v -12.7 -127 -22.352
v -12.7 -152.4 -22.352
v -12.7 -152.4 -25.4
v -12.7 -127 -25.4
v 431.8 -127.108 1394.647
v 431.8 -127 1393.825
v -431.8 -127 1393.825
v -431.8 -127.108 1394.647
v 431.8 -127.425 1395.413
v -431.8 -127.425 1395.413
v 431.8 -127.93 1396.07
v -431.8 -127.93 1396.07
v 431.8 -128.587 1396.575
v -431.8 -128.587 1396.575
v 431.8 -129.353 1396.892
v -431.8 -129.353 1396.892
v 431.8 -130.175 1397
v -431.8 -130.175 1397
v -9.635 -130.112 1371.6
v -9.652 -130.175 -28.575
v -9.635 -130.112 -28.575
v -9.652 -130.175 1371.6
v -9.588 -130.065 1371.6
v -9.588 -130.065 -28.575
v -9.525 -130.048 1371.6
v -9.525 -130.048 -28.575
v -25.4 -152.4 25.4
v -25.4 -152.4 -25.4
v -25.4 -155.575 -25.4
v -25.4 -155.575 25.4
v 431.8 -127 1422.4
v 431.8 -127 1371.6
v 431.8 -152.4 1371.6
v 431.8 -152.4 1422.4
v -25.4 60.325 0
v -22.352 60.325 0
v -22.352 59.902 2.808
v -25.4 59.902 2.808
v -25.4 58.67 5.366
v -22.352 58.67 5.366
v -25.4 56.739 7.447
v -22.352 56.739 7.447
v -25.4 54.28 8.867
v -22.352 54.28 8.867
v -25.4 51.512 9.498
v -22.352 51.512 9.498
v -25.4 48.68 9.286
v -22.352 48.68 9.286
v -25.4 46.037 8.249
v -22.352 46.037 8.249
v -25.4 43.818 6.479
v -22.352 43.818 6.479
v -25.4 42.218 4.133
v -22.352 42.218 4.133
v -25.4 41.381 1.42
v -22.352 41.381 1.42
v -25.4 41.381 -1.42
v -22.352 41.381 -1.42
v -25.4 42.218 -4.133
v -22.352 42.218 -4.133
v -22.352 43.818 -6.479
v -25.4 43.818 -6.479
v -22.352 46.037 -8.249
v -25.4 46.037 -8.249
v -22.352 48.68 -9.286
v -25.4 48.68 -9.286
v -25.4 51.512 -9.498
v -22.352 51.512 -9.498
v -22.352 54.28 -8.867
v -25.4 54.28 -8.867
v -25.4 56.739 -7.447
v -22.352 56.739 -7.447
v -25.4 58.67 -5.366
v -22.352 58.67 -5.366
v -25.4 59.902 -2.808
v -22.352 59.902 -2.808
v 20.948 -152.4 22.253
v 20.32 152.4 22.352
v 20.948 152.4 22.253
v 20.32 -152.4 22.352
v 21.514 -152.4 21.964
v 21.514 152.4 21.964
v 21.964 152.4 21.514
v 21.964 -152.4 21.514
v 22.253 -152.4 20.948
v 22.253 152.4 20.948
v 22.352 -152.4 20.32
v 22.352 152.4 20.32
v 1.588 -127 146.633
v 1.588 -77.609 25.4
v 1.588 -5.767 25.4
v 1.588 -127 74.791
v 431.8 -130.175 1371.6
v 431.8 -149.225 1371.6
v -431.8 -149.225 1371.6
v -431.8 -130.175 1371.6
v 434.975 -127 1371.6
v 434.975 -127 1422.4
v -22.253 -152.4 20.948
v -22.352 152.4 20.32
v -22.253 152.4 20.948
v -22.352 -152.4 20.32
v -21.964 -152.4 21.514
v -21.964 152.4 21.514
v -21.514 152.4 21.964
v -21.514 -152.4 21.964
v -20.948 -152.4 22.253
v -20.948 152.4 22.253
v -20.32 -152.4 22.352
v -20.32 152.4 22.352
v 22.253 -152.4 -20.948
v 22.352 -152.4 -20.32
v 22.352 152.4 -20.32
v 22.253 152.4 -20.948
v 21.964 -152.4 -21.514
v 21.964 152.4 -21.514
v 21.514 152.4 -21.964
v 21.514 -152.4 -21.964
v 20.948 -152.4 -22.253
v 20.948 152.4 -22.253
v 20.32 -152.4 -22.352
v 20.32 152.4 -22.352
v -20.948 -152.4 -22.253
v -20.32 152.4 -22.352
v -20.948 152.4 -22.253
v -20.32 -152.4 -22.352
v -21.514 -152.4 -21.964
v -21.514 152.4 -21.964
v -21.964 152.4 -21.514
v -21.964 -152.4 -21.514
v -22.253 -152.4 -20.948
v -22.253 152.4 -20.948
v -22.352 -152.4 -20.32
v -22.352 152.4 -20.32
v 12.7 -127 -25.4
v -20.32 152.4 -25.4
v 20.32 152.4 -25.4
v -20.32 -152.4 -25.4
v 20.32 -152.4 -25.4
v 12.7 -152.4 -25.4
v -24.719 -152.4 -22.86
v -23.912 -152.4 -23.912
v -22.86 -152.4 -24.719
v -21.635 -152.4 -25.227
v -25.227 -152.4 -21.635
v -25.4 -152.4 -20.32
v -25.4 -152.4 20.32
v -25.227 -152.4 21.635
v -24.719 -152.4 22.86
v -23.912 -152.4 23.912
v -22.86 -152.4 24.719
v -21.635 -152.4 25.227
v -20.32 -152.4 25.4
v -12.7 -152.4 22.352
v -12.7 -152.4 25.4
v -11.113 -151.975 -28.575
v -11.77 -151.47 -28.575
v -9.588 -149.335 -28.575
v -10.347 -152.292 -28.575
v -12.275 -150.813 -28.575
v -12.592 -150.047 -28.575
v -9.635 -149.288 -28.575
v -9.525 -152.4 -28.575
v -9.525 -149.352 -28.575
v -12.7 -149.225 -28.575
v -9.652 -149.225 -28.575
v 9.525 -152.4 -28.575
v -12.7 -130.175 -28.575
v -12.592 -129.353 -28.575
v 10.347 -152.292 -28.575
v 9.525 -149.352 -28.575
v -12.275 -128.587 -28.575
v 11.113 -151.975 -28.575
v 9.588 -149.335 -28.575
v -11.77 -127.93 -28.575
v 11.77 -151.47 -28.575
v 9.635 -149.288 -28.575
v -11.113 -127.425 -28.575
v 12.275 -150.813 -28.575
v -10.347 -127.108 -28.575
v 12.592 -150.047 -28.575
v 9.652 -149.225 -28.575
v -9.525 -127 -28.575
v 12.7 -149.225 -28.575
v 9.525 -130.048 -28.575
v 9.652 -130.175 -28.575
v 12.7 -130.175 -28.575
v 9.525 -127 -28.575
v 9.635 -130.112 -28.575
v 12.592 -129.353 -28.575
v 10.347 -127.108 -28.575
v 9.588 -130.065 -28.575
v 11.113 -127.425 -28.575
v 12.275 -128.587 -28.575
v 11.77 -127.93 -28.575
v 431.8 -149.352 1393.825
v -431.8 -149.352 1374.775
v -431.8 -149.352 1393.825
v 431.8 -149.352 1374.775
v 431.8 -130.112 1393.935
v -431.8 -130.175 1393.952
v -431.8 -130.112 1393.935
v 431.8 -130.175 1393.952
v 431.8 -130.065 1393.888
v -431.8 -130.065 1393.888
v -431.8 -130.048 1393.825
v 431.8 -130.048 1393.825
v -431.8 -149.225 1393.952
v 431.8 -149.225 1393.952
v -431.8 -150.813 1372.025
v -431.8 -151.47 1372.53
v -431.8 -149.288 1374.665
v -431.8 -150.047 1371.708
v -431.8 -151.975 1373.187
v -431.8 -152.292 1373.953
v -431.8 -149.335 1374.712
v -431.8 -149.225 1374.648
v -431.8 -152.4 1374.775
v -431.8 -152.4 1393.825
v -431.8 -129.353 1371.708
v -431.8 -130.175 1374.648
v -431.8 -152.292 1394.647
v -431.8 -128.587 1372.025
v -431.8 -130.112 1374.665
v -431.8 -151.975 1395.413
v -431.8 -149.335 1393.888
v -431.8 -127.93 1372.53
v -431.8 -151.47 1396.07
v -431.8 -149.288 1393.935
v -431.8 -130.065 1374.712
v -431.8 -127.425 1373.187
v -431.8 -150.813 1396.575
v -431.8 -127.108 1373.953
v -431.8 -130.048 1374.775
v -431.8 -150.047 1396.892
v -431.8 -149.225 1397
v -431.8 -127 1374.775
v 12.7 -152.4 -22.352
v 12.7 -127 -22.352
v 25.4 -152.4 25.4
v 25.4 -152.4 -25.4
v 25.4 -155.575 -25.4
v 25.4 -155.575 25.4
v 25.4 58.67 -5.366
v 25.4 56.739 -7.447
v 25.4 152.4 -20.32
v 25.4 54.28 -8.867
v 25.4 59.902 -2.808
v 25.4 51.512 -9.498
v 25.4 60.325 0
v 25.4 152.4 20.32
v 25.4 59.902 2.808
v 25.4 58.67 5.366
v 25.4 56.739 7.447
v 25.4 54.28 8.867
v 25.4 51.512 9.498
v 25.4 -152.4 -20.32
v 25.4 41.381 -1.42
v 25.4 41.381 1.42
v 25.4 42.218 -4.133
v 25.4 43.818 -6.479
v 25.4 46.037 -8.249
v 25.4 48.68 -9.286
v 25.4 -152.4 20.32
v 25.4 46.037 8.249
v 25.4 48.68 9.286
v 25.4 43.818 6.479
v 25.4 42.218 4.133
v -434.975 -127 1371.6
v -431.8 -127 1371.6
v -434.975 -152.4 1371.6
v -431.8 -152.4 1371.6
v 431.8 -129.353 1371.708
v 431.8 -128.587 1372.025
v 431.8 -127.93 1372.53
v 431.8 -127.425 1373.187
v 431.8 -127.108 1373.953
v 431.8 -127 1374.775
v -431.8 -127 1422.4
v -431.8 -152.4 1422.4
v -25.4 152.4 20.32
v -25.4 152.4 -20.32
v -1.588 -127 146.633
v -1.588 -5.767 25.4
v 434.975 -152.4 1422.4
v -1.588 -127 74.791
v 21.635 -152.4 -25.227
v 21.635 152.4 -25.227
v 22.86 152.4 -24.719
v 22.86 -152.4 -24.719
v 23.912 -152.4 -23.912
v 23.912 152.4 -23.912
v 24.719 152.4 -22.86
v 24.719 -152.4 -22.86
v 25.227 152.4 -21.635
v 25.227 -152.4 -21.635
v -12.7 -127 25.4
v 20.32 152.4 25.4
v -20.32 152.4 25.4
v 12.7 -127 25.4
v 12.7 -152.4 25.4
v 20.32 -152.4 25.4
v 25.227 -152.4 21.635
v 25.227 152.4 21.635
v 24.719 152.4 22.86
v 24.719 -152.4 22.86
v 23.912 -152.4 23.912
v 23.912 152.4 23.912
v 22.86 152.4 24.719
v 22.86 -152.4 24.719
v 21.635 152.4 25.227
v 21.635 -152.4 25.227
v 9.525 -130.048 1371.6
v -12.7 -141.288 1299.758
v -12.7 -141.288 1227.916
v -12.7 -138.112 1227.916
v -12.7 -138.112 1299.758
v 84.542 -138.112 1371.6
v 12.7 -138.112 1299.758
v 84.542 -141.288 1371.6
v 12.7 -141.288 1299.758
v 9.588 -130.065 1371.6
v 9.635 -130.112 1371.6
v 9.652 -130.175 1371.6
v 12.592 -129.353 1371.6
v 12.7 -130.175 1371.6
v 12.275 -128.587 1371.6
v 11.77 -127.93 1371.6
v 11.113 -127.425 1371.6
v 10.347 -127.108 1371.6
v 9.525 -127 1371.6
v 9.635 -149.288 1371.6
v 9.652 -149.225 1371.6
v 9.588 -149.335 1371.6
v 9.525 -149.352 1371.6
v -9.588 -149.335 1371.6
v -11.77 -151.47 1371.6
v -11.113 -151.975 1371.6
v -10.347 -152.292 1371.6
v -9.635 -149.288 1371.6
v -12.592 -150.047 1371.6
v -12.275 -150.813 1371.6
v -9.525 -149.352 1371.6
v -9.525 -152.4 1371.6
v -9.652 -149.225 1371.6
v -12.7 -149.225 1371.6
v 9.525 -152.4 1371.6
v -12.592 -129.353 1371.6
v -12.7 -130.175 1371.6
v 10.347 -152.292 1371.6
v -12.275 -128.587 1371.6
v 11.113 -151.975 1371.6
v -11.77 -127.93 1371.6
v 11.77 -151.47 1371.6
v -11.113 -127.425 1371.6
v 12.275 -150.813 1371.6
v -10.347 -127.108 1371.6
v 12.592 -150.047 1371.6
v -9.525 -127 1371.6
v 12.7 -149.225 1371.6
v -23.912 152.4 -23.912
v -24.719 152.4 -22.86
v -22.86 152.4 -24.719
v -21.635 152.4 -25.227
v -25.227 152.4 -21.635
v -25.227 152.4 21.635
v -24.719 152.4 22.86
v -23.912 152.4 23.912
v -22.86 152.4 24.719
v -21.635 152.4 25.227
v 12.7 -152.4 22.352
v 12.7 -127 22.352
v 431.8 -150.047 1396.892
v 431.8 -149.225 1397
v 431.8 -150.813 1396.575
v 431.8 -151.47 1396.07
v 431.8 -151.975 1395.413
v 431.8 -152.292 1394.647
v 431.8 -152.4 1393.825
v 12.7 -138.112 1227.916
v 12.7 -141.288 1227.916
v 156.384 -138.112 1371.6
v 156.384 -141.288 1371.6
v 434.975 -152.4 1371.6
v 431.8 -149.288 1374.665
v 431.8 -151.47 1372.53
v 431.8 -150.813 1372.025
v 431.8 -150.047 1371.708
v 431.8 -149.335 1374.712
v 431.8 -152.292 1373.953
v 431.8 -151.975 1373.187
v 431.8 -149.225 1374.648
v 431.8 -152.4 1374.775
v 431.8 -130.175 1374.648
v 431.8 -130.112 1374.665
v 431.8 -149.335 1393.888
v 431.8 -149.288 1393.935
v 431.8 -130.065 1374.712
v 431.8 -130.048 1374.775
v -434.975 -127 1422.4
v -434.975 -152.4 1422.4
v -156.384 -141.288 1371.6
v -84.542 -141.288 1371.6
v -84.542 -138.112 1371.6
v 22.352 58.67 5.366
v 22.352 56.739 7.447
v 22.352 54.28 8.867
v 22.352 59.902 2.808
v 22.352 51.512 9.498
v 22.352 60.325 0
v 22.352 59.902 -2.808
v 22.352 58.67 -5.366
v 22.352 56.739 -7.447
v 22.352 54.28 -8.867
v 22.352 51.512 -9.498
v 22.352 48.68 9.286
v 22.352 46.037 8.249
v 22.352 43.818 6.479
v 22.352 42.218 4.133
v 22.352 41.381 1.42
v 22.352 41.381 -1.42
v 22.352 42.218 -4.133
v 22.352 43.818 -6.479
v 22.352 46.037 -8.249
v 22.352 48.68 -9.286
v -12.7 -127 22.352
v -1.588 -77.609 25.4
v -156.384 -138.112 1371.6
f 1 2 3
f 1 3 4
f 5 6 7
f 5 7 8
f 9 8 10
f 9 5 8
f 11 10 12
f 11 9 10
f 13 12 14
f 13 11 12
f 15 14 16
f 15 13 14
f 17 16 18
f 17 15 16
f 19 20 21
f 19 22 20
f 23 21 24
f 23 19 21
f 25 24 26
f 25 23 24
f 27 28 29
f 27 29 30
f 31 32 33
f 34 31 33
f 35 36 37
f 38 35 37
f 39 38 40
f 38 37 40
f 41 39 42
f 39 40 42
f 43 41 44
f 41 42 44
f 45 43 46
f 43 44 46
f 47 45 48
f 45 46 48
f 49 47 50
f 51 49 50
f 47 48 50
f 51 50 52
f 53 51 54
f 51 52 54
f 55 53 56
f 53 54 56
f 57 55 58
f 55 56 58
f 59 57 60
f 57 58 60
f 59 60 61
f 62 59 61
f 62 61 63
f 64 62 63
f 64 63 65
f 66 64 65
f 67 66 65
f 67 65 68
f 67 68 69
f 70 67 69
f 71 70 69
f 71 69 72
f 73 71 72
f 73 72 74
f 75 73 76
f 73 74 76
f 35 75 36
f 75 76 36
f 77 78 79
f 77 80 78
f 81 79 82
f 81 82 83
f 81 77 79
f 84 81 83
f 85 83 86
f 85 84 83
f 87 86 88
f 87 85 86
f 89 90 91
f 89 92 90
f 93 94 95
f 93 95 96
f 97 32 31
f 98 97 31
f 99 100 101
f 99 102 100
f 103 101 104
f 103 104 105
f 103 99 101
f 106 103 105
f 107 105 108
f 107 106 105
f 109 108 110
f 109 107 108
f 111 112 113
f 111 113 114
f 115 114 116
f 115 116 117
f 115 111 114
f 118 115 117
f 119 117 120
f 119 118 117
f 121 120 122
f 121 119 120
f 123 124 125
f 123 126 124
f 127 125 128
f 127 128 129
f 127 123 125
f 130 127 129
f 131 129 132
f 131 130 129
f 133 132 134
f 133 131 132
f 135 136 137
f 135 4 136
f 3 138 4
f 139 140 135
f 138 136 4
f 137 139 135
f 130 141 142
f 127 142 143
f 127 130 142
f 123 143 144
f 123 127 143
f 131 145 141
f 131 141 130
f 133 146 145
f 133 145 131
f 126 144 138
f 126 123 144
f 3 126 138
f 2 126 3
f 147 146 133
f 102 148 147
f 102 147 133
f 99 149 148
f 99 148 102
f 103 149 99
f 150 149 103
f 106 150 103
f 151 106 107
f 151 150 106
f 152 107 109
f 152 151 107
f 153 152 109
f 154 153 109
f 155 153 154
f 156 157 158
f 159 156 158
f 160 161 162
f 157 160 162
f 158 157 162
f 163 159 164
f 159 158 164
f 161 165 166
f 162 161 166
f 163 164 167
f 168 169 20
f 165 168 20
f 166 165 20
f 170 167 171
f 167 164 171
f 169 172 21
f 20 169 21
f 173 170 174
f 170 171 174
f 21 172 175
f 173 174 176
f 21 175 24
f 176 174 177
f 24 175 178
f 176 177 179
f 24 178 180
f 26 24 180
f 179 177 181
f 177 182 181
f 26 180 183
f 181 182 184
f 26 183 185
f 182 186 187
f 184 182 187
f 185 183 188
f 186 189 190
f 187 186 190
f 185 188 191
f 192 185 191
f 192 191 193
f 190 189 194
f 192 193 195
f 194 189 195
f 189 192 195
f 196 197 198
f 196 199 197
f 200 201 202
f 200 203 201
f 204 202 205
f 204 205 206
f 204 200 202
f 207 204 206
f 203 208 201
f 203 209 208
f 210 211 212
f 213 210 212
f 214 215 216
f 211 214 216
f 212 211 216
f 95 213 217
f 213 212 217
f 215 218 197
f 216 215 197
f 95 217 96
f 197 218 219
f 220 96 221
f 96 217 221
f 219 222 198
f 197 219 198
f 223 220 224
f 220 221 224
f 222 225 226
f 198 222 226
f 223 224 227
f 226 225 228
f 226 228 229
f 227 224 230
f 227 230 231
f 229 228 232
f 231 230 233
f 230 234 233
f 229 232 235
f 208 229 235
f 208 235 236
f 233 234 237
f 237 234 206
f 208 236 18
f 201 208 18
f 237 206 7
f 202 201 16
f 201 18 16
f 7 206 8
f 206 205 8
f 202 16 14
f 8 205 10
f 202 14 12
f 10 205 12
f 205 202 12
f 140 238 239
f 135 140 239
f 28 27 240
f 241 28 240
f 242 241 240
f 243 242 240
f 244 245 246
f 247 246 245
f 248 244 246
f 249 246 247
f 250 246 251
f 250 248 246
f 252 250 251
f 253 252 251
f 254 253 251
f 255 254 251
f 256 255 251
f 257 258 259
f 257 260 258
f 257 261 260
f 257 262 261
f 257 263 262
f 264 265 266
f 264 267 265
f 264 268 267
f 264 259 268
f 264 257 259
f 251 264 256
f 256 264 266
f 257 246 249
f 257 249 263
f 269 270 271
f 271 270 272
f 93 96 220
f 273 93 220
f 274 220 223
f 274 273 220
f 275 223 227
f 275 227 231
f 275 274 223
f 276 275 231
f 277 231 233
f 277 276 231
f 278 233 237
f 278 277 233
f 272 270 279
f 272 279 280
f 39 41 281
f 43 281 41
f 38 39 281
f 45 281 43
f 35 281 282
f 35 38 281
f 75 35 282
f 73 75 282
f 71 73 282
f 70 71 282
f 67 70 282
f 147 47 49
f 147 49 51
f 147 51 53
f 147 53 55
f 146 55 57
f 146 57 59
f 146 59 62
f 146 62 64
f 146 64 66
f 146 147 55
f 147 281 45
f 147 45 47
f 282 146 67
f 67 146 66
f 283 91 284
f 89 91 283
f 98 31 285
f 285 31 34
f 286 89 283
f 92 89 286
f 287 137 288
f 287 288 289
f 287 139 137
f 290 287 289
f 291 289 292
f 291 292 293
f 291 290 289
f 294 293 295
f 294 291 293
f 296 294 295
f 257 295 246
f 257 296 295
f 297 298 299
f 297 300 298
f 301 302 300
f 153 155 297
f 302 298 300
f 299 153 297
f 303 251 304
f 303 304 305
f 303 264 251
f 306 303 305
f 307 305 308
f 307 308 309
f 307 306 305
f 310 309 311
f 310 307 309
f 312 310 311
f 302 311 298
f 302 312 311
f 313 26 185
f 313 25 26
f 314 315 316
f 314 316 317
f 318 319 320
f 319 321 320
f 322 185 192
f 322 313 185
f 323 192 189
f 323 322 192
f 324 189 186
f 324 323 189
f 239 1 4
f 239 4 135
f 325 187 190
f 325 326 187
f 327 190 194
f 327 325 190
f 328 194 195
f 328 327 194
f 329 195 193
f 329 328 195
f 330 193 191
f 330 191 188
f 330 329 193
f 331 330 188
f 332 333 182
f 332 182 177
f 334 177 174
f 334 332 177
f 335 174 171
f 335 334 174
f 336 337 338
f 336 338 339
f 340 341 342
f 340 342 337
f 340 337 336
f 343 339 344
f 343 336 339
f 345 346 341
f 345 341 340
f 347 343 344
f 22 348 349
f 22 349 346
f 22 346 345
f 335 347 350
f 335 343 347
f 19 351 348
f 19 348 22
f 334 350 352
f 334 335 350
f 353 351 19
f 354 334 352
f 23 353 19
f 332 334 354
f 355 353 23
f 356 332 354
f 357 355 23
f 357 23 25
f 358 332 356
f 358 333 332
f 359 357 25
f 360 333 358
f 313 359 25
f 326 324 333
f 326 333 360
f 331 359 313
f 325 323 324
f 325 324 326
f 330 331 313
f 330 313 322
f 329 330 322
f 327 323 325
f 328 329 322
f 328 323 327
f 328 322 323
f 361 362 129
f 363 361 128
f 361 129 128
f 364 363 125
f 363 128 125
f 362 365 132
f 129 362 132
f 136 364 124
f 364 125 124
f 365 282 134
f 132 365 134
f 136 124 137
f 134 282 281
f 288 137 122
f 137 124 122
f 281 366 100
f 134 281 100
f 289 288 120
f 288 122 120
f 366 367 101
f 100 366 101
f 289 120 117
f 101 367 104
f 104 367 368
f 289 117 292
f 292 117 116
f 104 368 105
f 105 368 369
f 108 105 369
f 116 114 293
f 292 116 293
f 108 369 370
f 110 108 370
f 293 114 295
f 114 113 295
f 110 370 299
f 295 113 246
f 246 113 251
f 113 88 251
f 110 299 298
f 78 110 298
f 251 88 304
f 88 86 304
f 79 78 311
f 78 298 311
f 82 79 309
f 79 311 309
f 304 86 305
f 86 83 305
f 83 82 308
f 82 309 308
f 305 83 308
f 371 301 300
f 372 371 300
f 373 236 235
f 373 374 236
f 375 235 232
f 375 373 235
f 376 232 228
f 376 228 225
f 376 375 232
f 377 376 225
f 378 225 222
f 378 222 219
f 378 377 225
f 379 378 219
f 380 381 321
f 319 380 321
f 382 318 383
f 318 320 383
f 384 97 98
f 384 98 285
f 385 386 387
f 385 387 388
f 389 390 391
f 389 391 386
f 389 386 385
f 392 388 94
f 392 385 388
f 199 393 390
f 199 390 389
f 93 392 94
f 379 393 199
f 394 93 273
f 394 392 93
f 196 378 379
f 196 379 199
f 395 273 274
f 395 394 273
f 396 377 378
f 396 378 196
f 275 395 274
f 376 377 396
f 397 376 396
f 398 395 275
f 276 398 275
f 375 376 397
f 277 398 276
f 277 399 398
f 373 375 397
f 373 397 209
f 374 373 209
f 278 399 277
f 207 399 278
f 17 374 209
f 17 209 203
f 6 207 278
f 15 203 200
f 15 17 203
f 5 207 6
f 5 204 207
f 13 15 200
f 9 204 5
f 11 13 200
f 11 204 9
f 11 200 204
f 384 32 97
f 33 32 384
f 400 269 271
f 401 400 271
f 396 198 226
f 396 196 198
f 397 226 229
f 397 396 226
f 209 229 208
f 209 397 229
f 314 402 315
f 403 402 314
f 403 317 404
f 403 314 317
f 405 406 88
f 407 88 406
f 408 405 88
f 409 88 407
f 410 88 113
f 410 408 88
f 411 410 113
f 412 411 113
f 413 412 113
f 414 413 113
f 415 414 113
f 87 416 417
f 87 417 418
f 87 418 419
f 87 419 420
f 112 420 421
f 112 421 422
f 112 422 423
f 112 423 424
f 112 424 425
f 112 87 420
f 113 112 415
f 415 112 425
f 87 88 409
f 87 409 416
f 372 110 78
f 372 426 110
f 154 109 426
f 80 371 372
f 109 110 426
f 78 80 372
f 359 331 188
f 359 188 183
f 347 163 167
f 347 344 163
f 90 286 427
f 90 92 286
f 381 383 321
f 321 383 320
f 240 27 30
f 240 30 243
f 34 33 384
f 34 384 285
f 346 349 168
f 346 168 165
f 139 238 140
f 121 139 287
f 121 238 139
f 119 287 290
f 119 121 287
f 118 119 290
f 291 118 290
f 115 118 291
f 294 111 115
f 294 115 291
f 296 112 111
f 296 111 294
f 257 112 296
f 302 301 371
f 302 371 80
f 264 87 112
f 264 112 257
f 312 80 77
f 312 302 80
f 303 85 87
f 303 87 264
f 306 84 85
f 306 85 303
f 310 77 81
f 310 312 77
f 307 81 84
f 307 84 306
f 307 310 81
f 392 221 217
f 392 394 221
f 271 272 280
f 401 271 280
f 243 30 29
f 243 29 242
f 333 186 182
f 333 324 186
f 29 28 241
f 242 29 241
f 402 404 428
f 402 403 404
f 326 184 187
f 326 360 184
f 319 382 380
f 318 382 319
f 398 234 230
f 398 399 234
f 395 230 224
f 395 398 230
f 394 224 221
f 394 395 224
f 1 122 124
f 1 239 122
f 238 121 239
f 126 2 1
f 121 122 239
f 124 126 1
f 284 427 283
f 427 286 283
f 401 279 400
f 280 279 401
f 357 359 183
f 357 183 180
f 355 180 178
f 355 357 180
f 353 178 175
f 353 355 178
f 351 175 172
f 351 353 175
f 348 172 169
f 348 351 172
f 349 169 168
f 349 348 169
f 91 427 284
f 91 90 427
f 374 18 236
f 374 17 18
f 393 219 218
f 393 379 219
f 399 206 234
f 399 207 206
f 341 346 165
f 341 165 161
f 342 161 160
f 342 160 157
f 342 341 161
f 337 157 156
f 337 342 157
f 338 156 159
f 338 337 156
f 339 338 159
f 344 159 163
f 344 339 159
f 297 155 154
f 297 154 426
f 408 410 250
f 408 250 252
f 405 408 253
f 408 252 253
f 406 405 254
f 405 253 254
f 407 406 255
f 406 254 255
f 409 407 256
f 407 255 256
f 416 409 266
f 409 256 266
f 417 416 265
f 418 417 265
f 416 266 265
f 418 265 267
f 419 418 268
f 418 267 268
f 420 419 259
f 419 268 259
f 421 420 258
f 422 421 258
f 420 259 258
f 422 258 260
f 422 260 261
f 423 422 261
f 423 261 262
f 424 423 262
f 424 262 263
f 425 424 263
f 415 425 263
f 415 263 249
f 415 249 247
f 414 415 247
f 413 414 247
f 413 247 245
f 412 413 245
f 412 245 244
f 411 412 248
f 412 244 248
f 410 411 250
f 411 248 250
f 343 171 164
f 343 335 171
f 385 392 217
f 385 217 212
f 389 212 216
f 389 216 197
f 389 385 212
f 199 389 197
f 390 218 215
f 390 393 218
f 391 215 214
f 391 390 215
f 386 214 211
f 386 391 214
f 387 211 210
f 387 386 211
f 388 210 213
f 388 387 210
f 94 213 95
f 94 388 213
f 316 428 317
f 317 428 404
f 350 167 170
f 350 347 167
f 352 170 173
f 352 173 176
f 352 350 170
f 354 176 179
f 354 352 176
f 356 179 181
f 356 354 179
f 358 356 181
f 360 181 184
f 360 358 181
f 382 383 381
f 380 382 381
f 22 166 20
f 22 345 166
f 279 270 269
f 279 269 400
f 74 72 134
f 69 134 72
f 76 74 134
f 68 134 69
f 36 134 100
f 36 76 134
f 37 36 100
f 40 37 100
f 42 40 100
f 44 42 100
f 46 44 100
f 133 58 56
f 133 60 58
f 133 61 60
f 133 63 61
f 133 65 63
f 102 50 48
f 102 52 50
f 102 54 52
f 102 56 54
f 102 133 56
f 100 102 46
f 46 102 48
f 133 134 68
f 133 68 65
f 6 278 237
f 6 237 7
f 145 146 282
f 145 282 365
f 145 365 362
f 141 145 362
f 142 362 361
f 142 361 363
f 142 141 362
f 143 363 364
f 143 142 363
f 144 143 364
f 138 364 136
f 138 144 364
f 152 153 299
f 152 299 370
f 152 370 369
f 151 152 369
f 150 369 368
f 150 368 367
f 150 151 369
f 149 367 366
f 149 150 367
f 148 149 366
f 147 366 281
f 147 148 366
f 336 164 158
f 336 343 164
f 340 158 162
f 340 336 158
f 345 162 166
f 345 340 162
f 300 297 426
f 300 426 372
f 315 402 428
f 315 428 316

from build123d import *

# Parameters (mm, degrees)
F1_DEPTH  = 152.4
F2_W      = 25.4
F2_H      = 25.4
F3_DEPTH  = 25.4
F6_DEPTH  = 1371.6
F7_DEPTH  = 28.575
F4_R      = 9.525
F8_DEPTH  = 25.4
F9_W      = 50.8
F9_H      = 50.8
F10_DEPTH = 3.175
F12_DEPTH = 1.5875
F14_DEPTH = 431.8
F17_DEPTH = 1.5875
F19_W     = 25.4
F19_H     = 50.8
F20_DEPTH = 3.175


with BuildPart() as f1:
    # F0 (on Front) → F1 (new body, symmetric)
    with BuildSketch(Plane.XZ):
        with BuildLine():
            ThreePointArc((25.4, 20.32), (23.9121024484, 23.9121024484), (20.32, 25.4))
            Line((20.32, 25.4), (-20.32, 25.4))
            ThreePointArc((-20.32, 25.4), (-23.9121024484, 23.9121024484), (-25.4, 20.32))
            Line((-25.4, 20.32), (-25.4, -20.32))
            ThreePointArc((-25.4, -20.32), (-23.9121024484, -23.9121024484), (-20.32, -25.4))
            Line((-20.32, -25.4), (20.32, -25.4))
            ThreePointArc((20.32, -25.4), (23.9121024484, -23.9121024484), (25.4, -20.32))
            Line((25.4, -20.32), (25.4, 20.32))
        make_face()
        with BuildLine():
            ThreePointArc((22.352, -20.32), (21.7568409794, -21.7568409794), (20.32, -22.352))
            Line((20.32, -22.352), (-20.32, -22.352))
            ThreePointArc((-20.32, -22.352), (-21.7568409794, -21.7568409794), (-22.352, -20.32))
            Line((-22.352, -20.32), (-22.352, 20.32))
            ThreePointArc((-22.352, 20.32), (-21.7568409794, 21.7568409794), (-20.32, 22.352))
            Line((-20.32, 22.352), (20.32, 22.352))
            ThreePointArc((20.32, 22.352), (21.7568409794, 21.7568409794), (22.352, 20.32))
            Line((22.352, 20.32), (22.352, -20.32))
        make_face(mode=Mode.SUBTRACT)
    extrude(amount=F1_DEPTH, both=True)

    # F2 (on Top) → F3 (cut, symmetric)
    with BuildSketch(Plane.XY):
        with Locations((0, -139.7)):
            Rectangle(F2_W, F2_H)
    extrude(amount=F3_DEPTH, both=True, mode=Mode.SUBTRACT)

    # F4 (on Right) → F8 (cut, symmetric)
    with BuildSketch(Plane.YZ):
        with Locations((50.8, 0)):
            Circle(F4_R)
    extrude(amount=F8_DEPTH, both=True, mode=Mode.SUBTRACT)


with BuildPart() as f6:
    # F5 (on Top) → F6 (new body)
    with BuildSketch(Plane.XY):
        with BuildLine():
            ThreePointArc((12.7, -130.175), (11.7700640303, -127.9299359697), (9.525, -127))
            Line((9.525, -127), (-9.525, -127))
            ThreePointArc((-9.525, -127), (-11.7700640303, -127.9299359697), (-12.7, -130.175))
            Line((-12.7, -130.175), (-12.7, -149.225))
            ThreePointArc((-12.7, -149.225), (-11.7700640303, -151.4700640303), (-9.525, -152.4))
            Line((-9.525, -152.4), (9.525, -152.4))
            ThreePointArc((9.525, -152.4), (11.7700640303, -151.4700640303), (12.7, -149.225))
            Line((12.7, -149.225), (12.7, -130.175))
        make_face()
        with BuildLine():
            ThreePointArc((9.652, -149.225), (9.6148025612, -149.3148025612), (9.525, -149.352))
            Line((9.525, -149.352), (-9.525, -149.352))
            ThreePointArc((-9.525, -149.352), (-9.6148025612, -149.3148025612), (-9.652, -149.225))
            Line((-9.652, -149.225), (-9.652, -130.175))
            ThreePointArc((-9.652, -130.175), (-9.6148025612, -130.0851974388), (-9.525, -130.048))
            Line((-9.525, -130.048), (9.525, -130.048))
            ThreePointArc((9.525, -130.048), (9.6148025612, -130.0851974388), (9.652, -130.175))
            Line((9.652, -130.175), (9.652, -149.225))
        make_face(mode=Mode.SUBTRACT)
    extrude(amount=F6_DEPTH)

    # F5 (on Top) → F7 (join)
    with BuildSketch(Plane.XY):
        with BuildLine():
            ThreePointArc((12.7, -130.175), (11.7700640303, -127.9299359697), (9.525, -127))
            Line((9.525, -127), (-9.525, -127))
            ThreePointArc((-9.525, -127), (-11.7700640303, -127.9299359697), (-12.7, -130.175))
            Line((-12.7, -130.175), (-12.7, -149.225))
            ThreePointArc((-12.7, -149.225), (-11.7700640303, -151.4700640303), (-9.525, -152.4))
            Line((-9.525, -152.4), (9.525, -152.4))
            ThreePointArc((9.525, -152.4), (11.7700640303, -151.4700640303), (12.7, -149.225))
            Line((12.7, -149.225), (12.7, -130.175))
        make_face()
        with BuildLine():
            ThreePointArc((9.652, -149.225), (9.6148025612, -149.3148025612), (9.525, -149.352))
            Line((9.525, -149.352), (-9.525, -149.352))
            ThreePointArc((-9.525, -149.352), (-9.6148025612, -149.3148025612), (-9.652, -149.225))
            Line((-9.652, -149.225), (-9.652, -130.175))
            ThreePointArc((-9.652, -130.175), (-9.6148025612, -130.0851974388), (-9.525, -130.048))
            Line((-9.525, -130.048), (9.525, -130.048))
            ThreePointArc((9.525, -130.048), (9.6148025612, -130.0851974388), (9.652, -130.175))
            Line((9.652, -130.175), (9.652, -149.225))
        make_face(mode=Mode.SUBTRACT)
    extrude(amount=-F7_DEPTH)


with BuildPart() as f10:
    # F9 (on face) → F10 (new body)
    with BuildSketch(Plane.XZ.offset(152.4)):
        Rectangle(F9_W, F9_H)
    extrude(amount=F10_DEPTH)


with BuildPart() as f12:
    # F11 (on Right) → F12 (new body, symmetric)
    with BuildSketch(Plane.YZ):
        Polygon((-77.6085913341, 25.4), (-5.7665423656, 25.4), (-127, 146.6334576344), (-127, 74.7914086659), align=None)
    extrude(amount=F12_DEPTH, both=True)


with BuildPart() as f14:
    # F13 (on Right) → F14 (new body, symmetric)
    with BuildSketch(Plane.YZ):
        with BuildLine():
            ThreePointArc((-152.4, 1374.775), (-151.4700640303, 1372.5299359697), (-149.225, 1371.6))
            Line((-149.225, 1371.6), (-130.175, 1371.6))
            ThreePointArc((-130.175, 1371.6), (-127.9299359697, 1372.5299359697), (-127, 1374.775))
            Line((-127, 1374.775), (-127, 1393.825))
            ThreePointArc((-127, 1393.825), (-127.9299359697, 1396.0700640303), (-130.175, 1397))
            Line((-130.175, 1397), (-149.225, 1397))
            ThreePointArc((-149.225, 1397), (-151.4700640303, 1396.0700640303), (-152.4, 1393.825))
            Line((-152.4, 1393.825), (-152.4, 1374.775))
        make_face()
        with BuildLine():
            ThreePointArc((-149.225, 1374.648), (-149.3148025612, 1374.6851974388), (-149.352, 1374.775))
            Line((-149.352, 1374.775), (-149.352, 1393.825))
            ThreePointArc((-149.352, 1393.825), (-149.3148025612, 1393.9148025612), (-149.225, 1393.952))
            Line((-149.225, 1393.952), (-130.175, 1393.952))
            ThreePointArc((-130.175, 1393.952), (-130.0851974388, 1393.9148025612), (-130.048, 1393.825))
            Line((-130.048, 1393.825), (-130.048, 1374.775))
            ThreePointArc((-130.048, 1374.775), (-130.0851974388, 1374.6851974388), (-130.175, 1374.648))
            Line((-130.175, 1374.648), (-149.225, 1374.648))
        make_face(mode=Mode.SUBTRACT)
    extrude(amount=F14_DEPTH, both=True)


with BuildPart() as f17:
    # F16 (on offset) → F17 (new body, symmetric)
    with BuildSketch(Plane.XZ.offset(139.7)):
        Polygon((-84.5420489686, 1371.6), (-156.3840979371, 1371.6), (-12.7, 1227.9159020629), (-12.7, 1299.7579510314), align=None)
    extrude(amount=F17_DEPTH, both=True)


with BuildPart() as f18_1:
    # F18: instance of F17
    add(f17.part.mirror(Plane.YZ))


with BuildPart() as f20:
    # F19 (on face) → F20 (new body)
    with BuildSketch(Plane(origin=(-431.8, 0, 0), x_dir=(0, -1, 0), z_dir=(-1, 0, 0))):
        with Locations((139.7, 1397)):
            Rectangle(F19_W, F19_H)
    extrude(amount=F20_DEPTH)


with BuildPart() as f21_1:
    # F21: instance of F20
    add(f20.part.mirror(Plane.YZ))


solid = Compound([f1.part, f6.part, f10.part, f12.part, f14.part, f17.part, f18_1.part, f20.part, f21_1.part])
